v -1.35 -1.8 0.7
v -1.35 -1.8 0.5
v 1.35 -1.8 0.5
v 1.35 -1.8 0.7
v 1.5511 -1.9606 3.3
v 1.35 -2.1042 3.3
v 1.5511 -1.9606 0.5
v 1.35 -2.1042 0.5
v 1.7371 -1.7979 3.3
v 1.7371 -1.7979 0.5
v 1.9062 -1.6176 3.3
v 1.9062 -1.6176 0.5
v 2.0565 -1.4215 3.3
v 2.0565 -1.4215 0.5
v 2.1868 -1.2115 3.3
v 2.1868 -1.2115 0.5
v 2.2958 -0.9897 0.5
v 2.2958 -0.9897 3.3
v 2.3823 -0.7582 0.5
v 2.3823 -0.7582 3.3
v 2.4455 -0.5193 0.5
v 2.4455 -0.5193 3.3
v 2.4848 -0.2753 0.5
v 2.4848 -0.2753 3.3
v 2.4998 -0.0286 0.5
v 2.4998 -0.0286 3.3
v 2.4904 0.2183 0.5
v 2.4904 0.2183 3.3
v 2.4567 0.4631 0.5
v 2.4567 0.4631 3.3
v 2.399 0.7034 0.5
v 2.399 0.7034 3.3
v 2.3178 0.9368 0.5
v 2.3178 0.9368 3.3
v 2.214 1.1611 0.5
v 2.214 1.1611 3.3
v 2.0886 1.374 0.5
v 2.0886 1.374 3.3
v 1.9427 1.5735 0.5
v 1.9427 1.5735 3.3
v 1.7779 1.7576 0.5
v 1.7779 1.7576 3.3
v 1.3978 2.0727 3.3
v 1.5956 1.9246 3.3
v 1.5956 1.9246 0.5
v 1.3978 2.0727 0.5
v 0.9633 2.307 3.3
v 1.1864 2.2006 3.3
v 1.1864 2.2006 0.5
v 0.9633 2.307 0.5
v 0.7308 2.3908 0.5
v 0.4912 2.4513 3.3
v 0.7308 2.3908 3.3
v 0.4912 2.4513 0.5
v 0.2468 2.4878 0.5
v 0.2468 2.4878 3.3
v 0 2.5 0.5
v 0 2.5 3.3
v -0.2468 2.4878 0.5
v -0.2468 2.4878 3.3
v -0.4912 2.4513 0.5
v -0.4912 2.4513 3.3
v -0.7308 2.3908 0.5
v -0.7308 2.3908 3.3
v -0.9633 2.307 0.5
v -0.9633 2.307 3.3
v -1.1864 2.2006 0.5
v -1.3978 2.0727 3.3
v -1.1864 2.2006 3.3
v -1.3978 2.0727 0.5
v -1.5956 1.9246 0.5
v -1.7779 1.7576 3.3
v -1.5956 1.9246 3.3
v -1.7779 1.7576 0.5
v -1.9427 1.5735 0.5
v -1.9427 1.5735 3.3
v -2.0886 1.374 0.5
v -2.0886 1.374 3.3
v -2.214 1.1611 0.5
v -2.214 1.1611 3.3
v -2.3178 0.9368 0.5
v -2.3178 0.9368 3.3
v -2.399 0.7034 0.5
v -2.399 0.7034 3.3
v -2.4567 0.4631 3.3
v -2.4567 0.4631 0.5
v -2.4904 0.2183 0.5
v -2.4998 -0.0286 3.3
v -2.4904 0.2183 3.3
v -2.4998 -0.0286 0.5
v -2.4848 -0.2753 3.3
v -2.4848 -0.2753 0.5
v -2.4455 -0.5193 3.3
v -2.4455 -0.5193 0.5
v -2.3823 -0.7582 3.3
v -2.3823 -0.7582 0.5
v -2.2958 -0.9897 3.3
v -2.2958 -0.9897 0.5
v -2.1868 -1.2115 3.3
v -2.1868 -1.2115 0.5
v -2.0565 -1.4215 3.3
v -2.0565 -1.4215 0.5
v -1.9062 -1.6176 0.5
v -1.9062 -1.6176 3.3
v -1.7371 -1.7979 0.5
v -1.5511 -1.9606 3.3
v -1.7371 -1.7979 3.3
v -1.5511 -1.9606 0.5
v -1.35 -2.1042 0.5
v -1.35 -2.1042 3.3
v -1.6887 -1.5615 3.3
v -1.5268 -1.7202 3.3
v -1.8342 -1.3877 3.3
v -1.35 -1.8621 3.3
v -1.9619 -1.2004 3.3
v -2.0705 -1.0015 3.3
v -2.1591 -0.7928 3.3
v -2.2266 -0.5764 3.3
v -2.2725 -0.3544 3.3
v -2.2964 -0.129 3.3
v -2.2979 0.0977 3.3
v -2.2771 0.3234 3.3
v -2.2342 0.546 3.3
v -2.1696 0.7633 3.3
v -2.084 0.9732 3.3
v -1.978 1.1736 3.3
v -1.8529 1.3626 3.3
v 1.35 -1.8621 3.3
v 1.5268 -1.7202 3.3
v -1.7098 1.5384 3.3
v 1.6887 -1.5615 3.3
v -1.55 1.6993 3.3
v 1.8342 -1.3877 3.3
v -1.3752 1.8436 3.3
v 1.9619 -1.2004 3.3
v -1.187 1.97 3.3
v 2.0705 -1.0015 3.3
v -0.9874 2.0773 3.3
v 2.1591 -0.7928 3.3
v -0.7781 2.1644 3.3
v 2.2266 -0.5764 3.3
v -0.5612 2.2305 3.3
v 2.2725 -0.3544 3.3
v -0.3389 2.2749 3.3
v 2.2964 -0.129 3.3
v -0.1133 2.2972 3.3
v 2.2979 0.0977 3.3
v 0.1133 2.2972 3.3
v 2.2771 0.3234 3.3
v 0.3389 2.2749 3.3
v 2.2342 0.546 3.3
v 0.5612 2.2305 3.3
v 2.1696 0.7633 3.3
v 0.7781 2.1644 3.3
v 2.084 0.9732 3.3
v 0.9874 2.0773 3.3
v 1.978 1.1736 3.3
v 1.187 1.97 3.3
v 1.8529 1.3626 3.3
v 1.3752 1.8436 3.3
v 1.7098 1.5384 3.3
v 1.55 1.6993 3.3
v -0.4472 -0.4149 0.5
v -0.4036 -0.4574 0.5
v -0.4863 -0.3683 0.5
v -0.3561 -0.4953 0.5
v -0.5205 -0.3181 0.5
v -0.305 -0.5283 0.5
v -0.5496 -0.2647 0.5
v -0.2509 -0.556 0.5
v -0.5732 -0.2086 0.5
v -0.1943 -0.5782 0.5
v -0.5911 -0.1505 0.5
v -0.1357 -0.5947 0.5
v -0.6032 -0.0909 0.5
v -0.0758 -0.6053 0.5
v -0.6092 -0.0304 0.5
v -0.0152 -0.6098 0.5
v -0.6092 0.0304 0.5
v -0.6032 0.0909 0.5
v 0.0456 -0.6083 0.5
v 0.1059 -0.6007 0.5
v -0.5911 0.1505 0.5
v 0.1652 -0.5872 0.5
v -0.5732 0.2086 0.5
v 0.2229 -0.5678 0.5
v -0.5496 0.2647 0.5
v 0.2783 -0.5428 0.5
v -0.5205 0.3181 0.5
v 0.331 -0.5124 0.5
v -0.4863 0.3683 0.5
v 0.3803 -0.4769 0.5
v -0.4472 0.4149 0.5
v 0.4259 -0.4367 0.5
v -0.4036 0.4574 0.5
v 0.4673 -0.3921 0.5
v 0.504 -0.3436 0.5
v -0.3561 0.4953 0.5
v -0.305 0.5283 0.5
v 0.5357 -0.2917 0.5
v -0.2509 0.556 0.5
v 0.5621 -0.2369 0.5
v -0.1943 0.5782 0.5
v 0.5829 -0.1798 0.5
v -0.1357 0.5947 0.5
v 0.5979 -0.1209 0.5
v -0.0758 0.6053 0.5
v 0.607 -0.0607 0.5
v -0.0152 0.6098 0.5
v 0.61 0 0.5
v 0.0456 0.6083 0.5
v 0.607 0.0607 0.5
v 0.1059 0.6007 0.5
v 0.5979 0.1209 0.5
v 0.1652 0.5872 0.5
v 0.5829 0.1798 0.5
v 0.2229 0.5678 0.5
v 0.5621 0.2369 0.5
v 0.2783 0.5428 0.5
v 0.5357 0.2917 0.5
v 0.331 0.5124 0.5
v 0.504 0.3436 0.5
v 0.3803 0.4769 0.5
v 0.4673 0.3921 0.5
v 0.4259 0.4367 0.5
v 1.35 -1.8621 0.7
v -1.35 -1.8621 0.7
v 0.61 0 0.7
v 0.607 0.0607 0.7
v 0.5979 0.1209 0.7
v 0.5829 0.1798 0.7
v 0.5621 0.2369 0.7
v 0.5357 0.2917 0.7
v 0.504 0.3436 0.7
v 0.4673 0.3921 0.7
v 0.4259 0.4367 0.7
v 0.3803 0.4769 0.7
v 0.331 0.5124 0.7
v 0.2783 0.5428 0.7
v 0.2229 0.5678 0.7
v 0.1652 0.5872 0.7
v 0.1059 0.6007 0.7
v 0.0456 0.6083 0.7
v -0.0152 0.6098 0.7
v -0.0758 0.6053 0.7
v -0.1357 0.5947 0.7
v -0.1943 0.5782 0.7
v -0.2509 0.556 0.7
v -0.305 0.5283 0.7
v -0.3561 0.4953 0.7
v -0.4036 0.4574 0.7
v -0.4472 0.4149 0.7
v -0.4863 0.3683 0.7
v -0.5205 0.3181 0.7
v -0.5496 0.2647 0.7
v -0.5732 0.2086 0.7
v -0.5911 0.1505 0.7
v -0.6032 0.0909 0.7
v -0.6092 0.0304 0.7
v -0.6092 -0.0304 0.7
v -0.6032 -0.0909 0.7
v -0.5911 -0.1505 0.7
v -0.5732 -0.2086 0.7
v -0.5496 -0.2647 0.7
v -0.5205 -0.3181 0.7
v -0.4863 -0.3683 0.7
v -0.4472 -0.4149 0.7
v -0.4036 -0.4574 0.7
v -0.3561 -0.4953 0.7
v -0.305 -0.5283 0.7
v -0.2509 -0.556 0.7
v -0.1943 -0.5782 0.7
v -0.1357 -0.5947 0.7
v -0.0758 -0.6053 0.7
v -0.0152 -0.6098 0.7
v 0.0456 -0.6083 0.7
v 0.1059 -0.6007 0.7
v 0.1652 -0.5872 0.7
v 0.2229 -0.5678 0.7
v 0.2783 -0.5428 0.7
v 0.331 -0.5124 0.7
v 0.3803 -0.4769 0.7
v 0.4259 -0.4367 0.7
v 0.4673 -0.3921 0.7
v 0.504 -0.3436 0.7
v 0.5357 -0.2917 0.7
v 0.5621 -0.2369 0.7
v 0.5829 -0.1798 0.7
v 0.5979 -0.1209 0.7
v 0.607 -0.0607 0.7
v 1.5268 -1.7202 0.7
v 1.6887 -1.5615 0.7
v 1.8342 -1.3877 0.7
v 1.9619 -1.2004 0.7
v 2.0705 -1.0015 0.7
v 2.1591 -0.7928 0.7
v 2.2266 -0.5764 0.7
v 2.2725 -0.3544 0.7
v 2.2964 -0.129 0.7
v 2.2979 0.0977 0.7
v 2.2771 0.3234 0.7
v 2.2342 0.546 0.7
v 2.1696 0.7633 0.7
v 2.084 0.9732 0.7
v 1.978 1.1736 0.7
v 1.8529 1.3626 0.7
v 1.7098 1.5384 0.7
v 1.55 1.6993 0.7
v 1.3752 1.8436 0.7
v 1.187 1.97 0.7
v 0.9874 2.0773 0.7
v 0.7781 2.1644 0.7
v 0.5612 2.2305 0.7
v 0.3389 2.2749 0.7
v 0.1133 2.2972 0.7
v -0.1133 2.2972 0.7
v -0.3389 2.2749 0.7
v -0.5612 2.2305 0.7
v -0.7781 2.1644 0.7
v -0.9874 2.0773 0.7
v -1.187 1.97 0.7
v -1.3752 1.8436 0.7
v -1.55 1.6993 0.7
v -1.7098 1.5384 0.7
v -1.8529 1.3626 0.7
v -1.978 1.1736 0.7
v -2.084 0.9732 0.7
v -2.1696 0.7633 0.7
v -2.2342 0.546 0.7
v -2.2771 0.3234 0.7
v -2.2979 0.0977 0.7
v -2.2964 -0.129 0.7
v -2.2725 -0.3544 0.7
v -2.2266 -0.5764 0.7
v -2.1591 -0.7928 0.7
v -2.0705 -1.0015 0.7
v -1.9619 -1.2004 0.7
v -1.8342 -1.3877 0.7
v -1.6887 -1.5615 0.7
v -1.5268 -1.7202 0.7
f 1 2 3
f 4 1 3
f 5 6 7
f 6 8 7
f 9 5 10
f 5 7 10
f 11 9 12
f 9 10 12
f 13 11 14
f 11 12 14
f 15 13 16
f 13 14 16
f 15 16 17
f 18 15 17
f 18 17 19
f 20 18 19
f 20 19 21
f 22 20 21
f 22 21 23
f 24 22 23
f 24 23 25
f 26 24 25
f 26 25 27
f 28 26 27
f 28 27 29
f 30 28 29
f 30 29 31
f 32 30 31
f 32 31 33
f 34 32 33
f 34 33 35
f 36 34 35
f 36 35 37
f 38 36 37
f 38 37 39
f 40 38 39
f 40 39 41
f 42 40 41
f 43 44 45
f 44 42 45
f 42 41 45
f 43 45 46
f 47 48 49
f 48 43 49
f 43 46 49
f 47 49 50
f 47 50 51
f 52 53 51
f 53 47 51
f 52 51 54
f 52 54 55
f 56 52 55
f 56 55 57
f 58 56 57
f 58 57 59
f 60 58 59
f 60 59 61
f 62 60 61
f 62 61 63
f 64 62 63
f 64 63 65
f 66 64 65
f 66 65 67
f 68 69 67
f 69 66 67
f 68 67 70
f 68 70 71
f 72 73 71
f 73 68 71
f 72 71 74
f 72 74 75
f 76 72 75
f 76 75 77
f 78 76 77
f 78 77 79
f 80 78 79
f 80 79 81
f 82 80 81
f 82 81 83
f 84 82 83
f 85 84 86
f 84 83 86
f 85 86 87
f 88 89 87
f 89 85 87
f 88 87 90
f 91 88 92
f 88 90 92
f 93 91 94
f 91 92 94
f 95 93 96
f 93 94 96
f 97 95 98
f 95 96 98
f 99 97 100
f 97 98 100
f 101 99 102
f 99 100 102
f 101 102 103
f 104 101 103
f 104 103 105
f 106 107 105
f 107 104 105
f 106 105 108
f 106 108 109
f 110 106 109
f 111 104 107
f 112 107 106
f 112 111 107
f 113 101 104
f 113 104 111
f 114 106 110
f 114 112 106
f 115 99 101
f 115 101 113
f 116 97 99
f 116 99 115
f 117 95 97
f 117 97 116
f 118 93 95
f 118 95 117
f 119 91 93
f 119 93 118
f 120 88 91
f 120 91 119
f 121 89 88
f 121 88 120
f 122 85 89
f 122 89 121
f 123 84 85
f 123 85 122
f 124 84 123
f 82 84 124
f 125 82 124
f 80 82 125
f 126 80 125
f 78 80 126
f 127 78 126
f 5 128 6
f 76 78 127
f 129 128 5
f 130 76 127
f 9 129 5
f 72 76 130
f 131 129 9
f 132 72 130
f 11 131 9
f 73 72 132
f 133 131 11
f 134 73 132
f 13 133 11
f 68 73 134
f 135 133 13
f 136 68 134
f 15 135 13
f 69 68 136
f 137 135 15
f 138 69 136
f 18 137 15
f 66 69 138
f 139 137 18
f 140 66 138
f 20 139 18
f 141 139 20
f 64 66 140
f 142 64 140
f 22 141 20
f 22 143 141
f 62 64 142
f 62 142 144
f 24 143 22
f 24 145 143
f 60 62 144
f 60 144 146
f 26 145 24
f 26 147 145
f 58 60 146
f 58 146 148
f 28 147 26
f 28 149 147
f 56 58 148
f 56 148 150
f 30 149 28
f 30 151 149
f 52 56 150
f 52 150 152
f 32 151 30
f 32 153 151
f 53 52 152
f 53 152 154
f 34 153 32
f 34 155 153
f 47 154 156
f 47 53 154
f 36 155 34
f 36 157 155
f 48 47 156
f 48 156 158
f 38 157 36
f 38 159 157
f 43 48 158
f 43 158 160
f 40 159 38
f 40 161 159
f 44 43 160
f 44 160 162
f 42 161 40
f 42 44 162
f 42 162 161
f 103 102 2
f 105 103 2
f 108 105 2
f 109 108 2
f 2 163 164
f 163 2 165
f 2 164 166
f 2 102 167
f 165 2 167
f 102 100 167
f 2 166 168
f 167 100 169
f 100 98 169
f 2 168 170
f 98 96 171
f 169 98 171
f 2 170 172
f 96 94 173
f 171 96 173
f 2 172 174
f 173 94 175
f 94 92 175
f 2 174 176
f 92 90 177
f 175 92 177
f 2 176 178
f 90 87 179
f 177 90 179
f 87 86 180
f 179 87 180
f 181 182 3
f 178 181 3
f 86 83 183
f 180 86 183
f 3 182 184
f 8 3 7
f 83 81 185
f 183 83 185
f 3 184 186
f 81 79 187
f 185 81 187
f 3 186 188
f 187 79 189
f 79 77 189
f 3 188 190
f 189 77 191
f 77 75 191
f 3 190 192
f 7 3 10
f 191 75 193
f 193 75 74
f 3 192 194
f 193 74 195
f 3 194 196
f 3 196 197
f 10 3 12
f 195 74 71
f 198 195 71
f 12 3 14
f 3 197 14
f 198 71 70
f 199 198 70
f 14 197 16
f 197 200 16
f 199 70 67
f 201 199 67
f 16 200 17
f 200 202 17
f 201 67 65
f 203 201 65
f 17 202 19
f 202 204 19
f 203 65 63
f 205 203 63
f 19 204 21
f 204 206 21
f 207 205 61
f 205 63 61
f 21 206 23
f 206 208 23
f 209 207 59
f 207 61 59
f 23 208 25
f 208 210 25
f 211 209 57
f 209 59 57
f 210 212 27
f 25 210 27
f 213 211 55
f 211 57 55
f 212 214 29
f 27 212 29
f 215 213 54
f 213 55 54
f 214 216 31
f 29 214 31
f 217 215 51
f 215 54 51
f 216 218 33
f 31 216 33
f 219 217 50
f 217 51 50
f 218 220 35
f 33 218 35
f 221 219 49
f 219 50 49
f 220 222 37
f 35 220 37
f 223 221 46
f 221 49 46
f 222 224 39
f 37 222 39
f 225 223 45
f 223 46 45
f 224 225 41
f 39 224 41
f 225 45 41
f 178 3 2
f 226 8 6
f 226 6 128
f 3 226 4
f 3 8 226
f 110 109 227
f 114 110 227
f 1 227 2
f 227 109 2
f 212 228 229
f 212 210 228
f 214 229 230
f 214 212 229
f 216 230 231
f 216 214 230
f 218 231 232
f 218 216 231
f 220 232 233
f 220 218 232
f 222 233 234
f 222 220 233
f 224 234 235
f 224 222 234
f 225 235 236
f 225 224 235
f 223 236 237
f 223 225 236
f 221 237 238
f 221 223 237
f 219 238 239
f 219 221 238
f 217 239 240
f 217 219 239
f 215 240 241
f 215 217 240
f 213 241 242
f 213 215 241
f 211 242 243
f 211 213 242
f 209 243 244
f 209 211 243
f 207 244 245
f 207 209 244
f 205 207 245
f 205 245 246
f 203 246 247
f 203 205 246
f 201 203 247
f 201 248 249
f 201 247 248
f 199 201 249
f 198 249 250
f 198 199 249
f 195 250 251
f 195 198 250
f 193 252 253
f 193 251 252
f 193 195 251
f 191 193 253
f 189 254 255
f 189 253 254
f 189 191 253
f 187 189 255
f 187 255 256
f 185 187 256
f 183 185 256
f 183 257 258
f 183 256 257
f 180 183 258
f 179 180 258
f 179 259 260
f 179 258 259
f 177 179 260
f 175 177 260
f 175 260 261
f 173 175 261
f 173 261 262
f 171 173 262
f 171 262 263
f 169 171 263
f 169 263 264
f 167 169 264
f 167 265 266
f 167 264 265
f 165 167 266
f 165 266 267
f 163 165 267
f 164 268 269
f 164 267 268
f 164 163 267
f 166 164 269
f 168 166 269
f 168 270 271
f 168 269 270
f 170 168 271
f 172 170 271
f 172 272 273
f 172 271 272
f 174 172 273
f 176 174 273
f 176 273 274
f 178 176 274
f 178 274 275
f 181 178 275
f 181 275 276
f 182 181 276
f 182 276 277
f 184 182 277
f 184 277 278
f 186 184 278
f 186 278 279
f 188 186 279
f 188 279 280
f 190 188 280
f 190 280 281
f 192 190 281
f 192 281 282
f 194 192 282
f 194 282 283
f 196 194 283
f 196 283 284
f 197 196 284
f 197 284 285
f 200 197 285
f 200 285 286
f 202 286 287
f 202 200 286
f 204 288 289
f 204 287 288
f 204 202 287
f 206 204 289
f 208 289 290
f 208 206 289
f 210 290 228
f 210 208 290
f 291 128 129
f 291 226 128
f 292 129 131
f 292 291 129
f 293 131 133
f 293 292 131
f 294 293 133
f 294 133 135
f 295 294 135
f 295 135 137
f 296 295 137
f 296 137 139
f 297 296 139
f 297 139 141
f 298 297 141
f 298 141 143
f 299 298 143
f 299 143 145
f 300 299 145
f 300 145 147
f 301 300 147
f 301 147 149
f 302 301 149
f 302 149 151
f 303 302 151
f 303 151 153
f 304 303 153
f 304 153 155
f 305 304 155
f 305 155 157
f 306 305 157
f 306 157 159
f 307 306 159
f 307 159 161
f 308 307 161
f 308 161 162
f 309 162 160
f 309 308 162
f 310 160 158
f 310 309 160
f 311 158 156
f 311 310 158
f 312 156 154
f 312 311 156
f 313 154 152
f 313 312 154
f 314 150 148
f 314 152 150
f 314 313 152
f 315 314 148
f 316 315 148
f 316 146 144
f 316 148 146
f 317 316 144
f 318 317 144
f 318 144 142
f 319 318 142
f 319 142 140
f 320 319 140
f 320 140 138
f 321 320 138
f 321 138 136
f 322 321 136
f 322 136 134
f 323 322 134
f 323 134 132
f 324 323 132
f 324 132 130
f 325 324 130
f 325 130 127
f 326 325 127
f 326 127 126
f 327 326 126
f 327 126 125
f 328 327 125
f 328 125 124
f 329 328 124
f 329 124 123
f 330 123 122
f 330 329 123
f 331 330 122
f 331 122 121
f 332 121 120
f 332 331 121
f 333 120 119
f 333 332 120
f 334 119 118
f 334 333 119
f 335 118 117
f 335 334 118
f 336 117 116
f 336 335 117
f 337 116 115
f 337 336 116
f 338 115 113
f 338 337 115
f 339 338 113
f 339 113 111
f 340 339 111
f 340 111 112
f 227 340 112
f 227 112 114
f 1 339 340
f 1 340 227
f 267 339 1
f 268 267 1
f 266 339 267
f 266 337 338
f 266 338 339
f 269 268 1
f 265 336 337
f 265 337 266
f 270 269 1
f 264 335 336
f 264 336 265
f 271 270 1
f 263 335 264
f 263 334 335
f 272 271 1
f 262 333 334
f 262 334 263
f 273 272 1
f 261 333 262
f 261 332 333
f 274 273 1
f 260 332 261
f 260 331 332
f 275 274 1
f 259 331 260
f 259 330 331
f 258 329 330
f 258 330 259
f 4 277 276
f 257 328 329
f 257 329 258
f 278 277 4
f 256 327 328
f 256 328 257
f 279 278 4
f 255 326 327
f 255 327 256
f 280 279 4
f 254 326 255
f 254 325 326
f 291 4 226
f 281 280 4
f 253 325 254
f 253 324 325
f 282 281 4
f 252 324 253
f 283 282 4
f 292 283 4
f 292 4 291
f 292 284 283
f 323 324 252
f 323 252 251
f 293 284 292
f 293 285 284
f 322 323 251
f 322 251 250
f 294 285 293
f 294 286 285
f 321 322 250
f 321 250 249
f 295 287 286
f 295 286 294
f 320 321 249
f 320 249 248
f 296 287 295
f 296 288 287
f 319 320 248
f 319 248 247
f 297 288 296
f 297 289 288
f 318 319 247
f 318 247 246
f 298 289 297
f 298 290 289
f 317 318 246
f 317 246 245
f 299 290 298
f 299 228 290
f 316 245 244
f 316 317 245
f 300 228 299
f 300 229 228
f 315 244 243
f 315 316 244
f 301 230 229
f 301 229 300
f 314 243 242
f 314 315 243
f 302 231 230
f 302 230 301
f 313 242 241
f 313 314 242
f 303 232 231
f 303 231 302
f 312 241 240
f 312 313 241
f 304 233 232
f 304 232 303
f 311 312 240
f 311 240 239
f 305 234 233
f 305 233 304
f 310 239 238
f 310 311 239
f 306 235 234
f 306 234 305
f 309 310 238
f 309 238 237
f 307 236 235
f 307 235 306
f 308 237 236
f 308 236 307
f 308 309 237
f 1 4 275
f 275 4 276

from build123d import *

# Parameters (mm, degrees)
BOX_W             = 2.7
BOX_H             = 2.7
BOX_DEPTH         = 10
CYLINDER003_R     = 0.61
CYLINDER003_DEPTH = 10
CYLINDER002_R     = 2.5
CYLINDER002_DEPTH = 2.8
THICKNESS_T       = -0.2


with BuildPart() as cube:
    # Box → Box (new body)
    with BuildSketch(Plane(origin=(-1.35, -4.5, 0), x_dir=(1, 0, 0), z_dir=(0, 0, 1))):
        with Locations((1.35, 1.35)):
            Rectangle(BOX_W, BOX_H)
    extrude(amount=BOX_DEPTH)


with BuildPart() as cylinder003:
    # Cylinder003 → Cylinder003 (new body)
    with BuildSketch(Plane.XY):
        Circle(CYLINDER003_R)
    extrude(amount=CYLINDER003_DEPTH)


with BuildPart() as bodyfront:
    # Cylinder002 → Cylinder002 (new body)
    with BuildSketch(Plane.XY):
        Circle(CYLINDER002_R)
    extrude(amount=CYLINDER002_DEPTH)

    # Thickness
    thickness_openings = [bodyfront.faces().sort_by_distance(p)[0] for p in [
        (0, 0, 2.8),
    ]]
    offset(amount=THICKNESS_T, openings=thickness_openings)


with BuildPart() as bodyfront_1:
    # Thickness placement: moved
    add(bodyfront.part.moved(Location((0, 0, 0.4))))

    # Cut002: cut Cylinder003
    add(cylinder003.part, mode=Mode.SUBTRACT)

    # Cut003: cut Cube
    add(cube.part, mode=Mode.SUBTRACT)


with BuildPart() as bodyfront_2:
    # Cut003 placement: moved
    add(bodyfront_1.part.moved(Location((0, 0, 0.1))))


solid = bodyfront_2.part
